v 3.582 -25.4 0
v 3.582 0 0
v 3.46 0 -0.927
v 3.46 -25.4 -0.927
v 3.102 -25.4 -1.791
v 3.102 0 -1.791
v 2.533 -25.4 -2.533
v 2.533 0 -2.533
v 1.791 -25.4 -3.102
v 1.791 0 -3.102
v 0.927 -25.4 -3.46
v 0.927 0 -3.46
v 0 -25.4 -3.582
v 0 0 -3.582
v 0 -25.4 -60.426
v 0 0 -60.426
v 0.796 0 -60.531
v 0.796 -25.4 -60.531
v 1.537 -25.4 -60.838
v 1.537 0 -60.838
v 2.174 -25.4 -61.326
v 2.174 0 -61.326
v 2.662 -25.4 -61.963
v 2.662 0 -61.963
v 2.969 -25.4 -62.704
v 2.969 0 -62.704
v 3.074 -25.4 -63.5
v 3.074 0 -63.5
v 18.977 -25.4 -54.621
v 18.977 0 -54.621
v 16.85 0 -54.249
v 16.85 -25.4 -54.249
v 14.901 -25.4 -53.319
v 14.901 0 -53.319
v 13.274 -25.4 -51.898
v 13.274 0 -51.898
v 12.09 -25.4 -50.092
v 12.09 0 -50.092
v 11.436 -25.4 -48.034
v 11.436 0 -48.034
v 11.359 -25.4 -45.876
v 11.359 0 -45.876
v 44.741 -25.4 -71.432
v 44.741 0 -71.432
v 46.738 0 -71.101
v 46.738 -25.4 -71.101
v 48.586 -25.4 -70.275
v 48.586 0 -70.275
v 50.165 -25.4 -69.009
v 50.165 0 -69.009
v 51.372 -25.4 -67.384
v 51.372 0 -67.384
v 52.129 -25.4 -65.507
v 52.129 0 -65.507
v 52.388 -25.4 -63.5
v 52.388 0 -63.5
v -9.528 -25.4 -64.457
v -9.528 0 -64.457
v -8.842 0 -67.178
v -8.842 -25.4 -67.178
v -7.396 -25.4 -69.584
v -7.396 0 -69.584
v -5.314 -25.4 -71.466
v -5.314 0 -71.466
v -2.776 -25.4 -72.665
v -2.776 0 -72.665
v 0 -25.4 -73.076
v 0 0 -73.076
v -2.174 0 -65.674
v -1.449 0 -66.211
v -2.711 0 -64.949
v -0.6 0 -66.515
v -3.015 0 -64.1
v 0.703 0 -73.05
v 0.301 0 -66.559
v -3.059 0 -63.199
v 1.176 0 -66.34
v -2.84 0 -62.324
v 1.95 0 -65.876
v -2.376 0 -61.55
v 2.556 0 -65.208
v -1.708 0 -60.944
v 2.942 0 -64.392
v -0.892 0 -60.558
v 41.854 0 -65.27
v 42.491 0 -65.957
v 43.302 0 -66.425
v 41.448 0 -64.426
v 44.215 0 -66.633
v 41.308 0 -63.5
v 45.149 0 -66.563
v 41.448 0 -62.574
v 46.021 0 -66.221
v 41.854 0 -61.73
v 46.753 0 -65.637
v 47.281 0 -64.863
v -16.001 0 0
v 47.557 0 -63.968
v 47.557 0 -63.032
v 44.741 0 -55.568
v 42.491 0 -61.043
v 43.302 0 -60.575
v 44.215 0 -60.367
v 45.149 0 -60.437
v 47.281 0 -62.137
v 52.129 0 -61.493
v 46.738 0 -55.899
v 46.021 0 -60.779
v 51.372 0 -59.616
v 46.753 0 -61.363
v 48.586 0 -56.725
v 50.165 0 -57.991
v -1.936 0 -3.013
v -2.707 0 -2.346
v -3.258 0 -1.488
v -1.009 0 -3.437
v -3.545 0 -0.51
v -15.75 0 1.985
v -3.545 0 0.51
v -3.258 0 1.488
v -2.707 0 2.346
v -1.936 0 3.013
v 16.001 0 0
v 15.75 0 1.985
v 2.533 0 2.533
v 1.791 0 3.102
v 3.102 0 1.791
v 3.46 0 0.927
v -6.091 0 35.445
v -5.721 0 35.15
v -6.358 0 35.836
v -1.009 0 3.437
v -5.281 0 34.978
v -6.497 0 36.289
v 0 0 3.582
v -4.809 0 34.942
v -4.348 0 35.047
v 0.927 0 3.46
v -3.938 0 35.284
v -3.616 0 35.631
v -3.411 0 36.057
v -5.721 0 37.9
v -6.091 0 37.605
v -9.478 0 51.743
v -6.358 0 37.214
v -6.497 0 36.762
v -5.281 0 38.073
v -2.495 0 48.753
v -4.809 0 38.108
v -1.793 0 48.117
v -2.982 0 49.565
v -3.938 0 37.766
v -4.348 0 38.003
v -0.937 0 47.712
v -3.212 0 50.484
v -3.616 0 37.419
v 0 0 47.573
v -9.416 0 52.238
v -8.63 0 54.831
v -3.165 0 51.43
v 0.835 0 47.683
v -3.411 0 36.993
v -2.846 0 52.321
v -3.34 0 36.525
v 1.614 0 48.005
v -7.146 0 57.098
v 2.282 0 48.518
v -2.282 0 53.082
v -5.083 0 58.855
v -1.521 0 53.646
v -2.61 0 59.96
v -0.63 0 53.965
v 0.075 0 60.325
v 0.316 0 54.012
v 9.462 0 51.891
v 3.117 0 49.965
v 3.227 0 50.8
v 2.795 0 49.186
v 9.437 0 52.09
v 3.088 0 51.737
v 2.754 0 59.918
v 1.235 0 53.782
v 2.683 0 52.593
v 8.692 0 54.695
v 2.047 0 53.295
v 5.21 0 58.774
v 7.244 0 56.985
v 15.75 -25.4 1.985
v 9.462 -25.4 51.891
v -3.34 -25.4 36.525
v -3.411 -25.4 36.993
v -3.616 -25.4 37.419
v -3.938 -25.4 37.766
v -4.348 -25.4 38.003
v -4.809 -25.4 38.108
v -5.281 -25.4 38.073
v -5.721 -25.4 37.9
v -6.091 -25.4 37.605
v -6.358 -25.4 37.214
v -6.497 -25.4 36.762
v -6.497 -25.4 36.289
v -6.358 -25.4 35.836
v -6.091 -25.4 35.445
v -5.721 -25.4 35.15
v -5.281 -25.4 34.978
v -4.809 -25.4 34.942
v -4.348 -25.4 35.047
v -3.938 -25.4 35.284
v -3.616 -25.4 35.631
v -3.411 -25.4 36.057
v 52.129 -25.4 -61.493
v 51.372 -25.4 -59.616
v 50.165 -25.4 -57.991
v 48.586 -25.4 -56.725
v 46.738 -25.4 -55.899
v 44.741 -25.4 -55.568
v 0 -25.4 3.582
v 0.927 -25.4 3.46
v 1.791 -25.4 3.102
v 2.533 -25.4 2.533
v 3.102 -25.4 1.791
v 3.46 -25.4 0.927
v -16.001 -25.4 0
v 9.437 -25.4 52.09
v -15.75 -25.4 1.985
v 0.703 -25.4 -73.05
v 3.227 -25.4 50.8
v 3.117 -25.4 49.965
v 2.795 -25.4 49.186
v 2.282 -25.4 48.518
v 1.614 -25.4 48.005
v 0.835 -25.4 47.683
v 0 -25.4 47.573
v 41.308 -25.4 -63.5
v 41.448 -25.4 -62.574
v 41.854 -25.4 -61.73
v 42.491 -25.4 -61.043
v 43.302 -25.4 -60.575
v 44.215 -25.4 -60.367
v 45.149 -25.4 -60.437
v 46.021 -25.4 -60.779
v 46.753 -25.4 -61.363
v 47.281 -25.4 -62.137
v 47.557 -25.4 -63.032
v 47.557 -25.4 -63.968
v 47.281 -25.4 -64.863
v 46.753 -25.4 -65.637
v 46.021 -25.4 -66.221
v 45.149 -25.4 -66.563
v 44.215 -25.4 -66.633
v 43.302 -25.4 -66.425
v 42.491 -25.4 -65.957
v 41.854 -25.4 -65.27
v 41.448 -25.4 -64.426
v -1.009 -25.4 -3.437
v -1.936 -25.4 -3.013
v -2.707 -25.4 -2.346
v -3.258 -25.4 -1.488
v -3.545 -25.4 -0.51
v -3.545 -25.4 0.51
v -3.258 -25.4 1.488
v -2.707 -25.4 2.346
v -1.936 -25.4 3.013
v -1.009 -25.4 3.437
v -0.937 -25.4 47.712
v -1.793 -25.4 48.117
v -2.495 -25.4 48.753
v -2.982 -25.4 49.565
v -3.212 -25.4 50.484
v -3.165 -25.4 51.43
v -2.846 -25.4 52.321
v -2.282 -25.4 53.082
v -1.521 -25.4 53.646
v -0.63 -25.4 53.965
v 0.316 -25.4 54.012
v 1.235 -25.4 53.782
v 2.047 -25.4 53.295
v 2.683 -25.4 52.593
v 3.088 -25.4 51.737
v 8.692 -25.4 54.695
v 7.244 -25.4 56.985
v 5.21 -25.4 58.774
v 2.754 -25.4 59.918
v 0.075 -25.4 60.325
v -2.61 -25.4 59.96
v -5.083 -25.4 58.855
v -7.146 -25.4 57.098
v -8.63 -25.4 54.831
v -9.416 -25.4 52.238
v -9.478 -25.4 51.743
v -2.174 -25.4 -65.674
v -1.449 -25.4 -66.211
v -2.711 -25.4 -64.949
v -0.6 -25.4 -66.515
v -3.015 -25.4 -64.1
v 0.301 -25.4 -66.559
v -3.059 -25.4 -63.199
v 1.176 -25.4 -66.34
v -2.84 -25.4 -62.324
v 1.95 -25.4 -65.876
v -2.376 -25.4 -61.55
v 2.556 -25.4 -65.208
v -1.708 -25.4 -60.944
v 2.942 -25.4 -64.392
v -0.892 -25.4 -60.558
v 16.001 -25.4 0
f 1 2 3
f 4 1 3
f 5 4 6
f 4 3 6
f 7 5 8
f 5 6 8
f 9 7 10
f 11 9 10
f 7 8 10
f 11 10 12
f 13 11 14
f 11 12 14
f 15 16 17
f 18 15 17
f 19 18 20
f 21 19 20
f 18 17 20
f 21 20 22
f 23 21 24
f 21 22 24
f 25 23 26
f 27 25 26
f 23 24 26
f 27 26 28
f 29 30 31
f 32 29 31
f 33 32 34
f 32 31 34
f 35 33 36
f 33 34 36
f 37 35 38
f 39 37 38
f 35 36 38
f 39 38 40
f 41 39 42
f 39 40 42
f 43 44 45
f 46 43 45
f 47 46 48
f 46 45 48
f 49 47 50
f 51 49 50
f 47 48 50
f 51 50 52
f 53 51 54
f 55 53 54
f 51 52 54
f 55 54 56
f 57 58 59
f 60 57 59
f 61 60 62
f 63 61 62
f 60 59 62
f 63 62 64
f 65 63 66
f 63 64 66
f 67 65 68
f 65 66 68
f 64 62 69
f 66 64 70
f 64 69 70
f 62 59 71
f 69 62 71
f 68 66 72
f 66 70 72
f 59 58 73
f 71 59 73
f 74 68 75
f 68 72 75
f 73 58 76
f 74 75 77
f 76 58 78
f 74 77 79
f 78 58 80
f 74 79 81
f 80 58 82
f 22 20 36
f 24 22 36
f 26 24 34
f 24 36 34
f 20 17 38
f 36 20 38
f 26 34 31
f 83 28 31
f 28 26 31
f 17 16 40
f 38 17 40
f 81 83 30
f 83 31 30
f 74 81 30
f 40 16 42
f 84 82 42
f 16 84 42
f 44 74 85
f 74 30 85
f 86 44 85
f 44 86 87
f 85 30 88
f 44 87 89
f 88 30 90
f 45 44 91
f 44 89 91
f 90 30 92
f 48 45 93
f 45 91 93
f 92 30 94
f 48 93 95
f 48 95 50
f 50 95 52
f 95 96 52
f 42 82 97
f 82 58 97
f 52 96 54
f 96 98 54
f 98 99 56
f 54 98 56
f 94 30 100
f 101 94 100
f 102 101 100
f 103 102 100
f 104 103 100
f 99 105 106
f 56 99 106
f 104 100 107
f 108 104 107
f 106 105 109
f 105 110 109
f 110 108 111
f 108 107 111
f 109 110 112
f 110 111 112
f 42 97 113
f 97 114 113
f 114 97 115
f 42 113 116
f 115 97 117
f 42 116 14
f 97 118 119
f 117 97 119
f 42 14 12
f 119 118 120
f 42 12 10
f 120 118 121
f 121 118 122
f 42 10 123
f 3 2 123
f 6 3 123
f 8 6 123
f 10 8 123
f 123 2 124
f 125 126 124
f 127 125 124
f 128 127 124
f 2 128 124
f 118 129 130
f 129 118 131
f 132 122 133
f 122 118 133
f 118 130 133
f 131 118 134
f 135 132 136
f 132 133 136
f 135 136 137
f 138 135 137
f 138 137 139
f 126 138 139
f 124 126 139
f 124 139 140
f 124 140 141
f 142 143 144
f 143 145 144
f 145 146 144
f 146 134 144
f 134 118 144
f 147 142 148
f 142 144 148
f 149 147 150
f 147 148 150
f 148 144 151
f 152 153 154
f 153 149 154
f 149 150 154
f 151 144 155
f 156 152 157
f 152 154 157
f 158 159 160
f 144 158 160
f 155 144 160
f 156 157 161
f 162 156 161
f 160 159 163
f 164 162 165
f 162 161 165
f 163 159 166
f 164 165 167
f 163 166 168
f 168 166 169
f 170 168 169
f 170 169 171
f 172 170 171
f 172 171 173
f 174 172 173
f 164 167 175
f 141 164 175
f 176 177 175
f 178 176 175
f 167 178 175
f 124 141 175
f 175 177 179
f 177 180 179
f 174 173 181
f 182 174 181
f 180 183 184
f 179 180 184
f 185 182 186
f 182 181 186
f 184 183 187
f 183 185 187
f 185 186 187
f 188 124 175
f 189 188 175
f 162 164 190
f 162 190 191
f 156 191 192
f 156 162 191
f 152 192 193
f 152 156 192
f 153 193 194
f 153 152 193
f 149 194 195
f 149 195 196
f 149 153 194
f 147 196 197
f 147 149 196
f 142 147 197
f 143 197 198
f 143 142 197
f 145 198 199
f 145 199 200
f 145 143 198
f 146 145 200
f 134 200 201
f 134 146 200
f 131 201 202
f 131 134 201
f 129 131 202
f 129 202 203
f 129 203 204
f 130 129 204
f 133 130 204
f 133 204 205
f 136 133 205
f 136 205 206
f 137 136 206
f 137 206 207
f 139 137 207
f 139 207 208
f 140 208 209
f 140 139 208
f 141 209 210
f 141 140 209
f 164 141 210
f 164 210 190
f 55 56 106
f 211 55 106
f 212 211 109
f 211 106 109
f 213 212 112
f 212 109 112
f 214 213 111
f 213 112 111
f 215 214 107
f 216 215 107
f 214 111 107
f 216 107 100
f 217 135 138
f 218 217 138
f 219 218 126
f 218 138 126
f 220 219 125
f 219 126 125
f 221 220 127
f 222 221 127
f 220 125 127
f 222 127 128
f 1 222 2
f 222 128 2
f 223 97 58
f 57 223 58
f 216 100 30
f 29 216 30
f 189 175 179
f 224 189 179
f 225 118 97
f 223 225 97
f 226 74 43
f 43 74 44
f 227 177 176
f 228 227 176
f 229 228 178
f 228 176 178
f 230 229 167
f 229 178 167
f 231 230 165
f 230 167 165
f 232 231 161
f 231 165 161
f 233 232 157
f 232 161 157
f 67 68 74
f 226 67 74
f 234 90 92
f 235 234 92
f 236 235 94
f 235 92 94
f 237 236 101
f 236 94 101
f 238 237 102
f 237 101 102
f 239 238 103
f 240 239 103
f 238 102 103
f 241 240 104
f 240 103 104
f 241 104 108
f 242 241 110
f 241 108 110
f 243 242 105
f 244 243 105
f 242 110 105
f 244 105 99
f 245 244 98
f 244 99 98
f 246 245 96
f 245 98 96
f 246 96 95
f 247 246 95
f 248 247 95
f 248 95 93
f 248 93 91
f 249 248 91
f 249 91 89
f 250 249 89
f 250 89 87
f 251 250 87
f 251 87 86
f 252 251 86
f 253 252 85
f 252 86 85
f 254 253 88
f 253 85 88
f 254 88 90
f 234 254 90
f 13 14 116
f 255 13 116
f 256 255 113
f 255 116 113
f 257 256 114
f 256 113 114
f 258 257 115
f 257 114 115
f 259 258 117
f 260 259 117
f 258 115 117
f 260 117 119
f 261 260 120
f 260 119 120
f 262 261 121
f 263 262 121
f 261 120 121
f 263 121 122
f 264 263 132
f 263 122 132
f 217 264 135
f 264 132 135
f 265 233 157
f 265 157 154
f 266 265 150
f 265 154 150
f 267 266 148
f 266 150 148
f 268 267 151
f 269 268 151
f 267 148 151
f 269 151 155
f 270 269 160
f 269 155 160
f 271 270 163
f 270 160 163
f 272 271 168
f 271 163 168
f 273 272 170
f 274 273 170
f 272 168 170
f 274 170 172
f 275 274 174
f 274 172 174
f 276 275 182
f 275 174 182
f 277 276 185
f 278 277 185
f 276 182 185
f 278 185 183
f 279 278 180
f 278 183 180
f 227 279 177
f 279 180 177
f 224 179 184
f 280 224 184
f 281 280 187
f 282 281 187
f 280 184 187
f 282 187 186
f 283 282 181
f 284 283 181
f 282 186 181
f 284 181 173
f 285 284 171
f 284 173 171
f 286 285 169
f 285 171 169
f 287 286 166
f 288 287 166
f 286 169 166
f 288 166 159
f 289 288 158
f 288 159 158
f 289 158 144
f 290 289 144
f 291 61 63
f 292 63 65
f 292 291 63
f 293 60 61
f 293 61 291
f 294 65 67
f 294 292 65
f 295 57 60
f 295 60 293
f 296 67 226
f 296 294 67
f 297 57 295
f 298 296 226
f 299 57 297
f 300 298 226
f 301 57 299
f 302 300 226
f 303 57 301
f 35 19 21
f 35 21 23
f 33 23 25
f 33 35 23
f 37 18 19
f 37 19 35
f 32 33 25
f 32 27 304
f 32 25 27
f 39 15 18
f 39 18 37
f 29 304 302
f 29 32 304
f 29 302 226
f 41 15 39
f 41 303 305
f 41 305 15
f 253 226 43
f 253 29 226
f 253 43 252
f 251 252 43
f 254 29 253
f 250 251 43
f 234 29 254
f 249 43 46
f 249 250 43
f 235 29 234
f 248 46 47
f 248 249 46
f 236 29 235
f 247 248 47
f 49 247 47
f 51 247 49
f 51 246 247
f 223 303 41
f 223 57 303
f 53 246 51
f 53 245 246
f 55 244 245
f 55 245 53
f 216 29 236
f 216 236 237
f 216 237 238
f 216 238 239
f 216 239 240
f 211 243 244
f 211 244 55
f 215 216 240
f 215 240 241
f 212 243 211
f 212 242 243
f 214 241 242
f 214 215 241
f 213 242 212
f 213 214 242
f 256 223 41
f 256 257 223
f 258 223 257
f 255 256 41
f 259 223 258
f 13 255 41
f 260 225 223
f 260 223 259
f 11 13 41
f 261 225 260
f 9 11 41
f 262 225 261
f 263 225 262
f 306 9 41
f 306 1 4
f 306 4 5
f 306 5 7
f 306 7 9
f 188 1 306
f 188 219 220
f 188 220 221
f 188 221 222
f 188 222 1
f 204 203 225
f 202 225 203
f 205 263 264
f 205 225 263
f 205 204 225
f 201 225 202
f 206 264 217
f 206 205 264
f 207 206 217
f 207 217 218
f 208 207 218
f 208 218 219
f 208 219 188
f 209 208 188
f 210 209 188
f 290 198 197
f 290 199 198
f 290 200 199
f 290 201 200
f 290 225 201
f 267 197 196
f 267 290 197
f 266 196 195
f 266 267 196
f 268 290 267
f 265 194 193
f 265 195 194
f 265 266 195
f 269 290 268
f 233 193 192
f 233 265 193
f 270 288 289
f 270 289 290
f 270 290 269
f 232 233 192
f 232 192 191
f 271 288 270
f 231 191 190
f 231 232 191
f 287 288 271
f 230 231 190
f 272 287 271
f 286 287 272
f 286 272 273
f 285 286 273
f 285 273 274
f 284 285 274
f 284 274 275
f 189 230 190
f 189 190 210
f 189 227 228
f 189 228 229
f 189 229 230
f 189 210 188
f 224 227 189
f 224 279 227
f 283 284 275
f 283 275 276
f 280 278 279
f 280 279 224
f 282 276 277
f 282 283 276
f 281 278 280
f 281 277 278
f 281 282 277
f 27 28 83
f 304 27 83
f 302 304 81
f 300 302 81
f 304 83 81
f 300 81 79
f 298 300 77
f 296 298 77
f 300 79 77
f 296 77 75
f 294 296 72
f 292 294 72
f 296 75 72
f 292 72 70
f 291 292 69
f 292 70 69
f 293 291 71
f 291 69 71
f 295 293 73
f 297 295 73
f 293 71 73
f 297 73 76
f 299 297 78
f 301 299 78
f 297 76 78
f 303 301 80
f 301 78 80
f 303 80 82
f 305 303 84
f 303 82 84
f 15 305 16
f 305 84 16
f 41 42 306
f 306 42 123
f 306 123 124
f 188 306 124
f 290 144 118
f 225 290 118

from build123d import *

# Parameters (mm, degrees)
F0_R     = 1.5875
F1_DEPTH = 25.4


with BuildPart() as f1:
    # F0 (on Front) → F1 (new body)
    with BuildSketch(Plane.XZ):
        with BuildLine():
            ThreePointArc((9.525, 50.8), (6.7351920908, 44.0648079092), (0, 41.275))
            Line((0, 41.275), (0, 15.875))
            ThreePointArc((0, 15.875), (10.500263397, 11.9063047833), (15.7504675666, 1.9845393503))
            Line((15.7504675666, 1.9845393503), (9.4622685099, 51.8913751176))
            ThreePointArc((9.4622685099, 51.8913751176), (9.5093041953, 51.3465882562), (9.525, 50.8))
        make_face()
        with BuildLine():
            Line((0, 15.875), (0, 41.275))
            ThreePointArc((0, 41.275), (-7.0608217366, 44.4070021583), (-9.4781770336, 51.7432842197))
            Line((-9.4781770336, 51.7432842197), (-15.7503596183, 1.9853959035))
            ThreePointArc((-15.7503596183, 1.9853959035), (-10.4999396434, 11.9065902963), (0, 15.875))
        make_face()
        with Locations((-4.9275723286, 36.5252)):
            Circle(F0_R, mode=Mode.SUBTRACT)
        with BuildLine():
            ThreePointArc((15.7504675666, 1.9845393503), (10.500263397, 11.9063047833), (0, 15.875))
            Line((0, 15.875), (0, 3.5818445827))
            ThreePointArc((0, 3.5818445827), (2.5327465936, 2.5327465936), (3.5818445827, 0))
            ThreePointArc((3.5818445827, 0), (2.5327465936, -2.5327465936), (0, -3.5818445827))
            Line((0, -3.5818445827), (0, -15.875))
            ThreePointArc((0, -15.875), (11.2253201513, -11.2253201513), (15.875, 0))
            ThreePointArc((15.875, 0), (15.8438363034, 0.9942213988), (15.7504675666, 1.9845393503))
        make_face()
        with BuildLine():
            Line((0, 3.5818445827), (0, 15.875))
            ThreePointArc((0, 15.875), (-10.4999396434, 11.9065902963), (-15.7503596183, 1.9853959035))
            ThreePointArc((-15.7503596183, 1.9853959035), (-11.9065902963, -10.4999396434), (0, -15.875))
            Line((0, -15.875), (0, -3.5818445827))
            ThreePointArc((0, -3.5818445827), (-3.5818445827, 0), (0, 3.5818445827))
        make_face()
        with BuildLine():
            ThreePointArc((0, -15.875), (-11.9065902963, -10.4999396434), (-15.7503596183, 1.9853959035))
            Line((-15.7503596183, 1.9853959035), (-16.0006267826, 0))
            Line((-16.0006267826, 0), (-9.5283009961, -64.4567694559))
            ThreePointArc((-9.5283009961, -64.4567694559), (-7.1016251441, -57.0757609029), (0, -53.923783228))
            Line((0, -53.923783228), (0, -15.875))
        make_face()
        with BuildLine():
            Line((16.0005170494, 0), (15.7504675666, 1.9845393503))
            ThreePointArc((15.7504675666, 1.9845393503), (15.8438363034, 0.9942213988), (15.875, 0))
            ThreePointArc((15.875, 0), (11.2253201513, -11.2253201513), (0, -15.875))
            Line((0, -15.875), (0, -53.923783228))
            ThreePointArc((0, -53.923783228), (6.7714078176, -56.7285921824), (9.576216772, -63.5))
            Line((9.576216772, -63.5), (36.5125, -63.5))
            ThreePointArc((36.5125, -63.5), (38.9413556042, -57.7852171371), (44.7414746571, -55.5678534573))
            Line((44.7414746571, -55.5678534573), (18.9771161719, -54.6211163395))
            ThreePointArc((18.9771161719, -54.6211163395), (13.2743662579, -51.8982857051), (11.3592341777, -45.876040911))
            Line((11.3592341777, -45.876040911), (16.0005170494, 0))
        make_face()
        with BuildLine():
            Line((36.5125, -63.5), (9.576216772, -63.5))
            ThreePointArc((9.576216772, -63.5), (7.0154951661, -70.0181864992), (0.7028263194, -73.050390716))
            Line((0.7028263194, -73.050390716), (44.7414746571, -71.4321465427))
            ThreePointArc((44.7414746571, -71.4321465427), (38.9413556042, -69.2147828629), (36.5125, -63.5))
        make_face()
        with BuildLine():
            ThreePointArc((-9.4781770336, 51.7432842197), (-7.0608217366, 44.4070021583), (0, 41.275))
            ThreePointArc((0, 41.275), (6.7351920908, 44.0648079092), (9.525, 50.8))
            ThreePointArc((9.525, 50.8), (9.5093041953, 51.3465882562), (9.4622685099, 51.8913751176))
            Line((9.4622685099, 51.8913751176), (9.4372495094, 52.089940579))
            ThreePointArc((9.4372495094, 52.089940579), (0.0749897766, 60.3247048003), (-9.4157689808, 52.2383739084))
            Line((-9.4157689808, 52.2383739084), (-9.4781770336, 51.7432842197))
        make_face()
        with BuildLine():
            ThreePointArc((3.2273454684, 50.8), (2.282077866, 48.517922134), (0, 47.5726545316))
            ThreePointArc((0, 47.5726545316), (-2.282077866, 53.082077866), (3.2273454684, 50.8))
        make_face(mode=Mode.SUBTRACT)
        with BuildLine():
            Line((0, -60.4259204753), (0, -53.923783228))
            ThreePointArc((0, -53.923783228), (-7.1016251441, -57.0757609029), (-9.5283009961, -64.4567694559))
            ThreePointArc((-9.5283009961, -64.4567694559), (-6.4242390971, -70.6016251441), (0, -73.076216772))
            Line((0, -73.076216772), (0.7028263194, -73.050390716))
            ThreePointArc((0.7028263194, -73.050390716), (7.0154951661, -70.0181864992), (9.576216772, -63.5))
            Line((9.576216772, -63.5), (3.0740795247, -63.5))
            ThreePointArc((3.0740795247, -63.5), (-2.1737024778, -65.6737024778), (0, -60.4259204753))
        make_face()
        with BuildLine():
            ThreePointArc((9.576216772, -63.5), (6.7714078176, -56.7285921824), (0, -53.923783228))
            Line((0, -53.923783228), (0, -60.4259204753))
            ThreePointArc((0, -60.4259204753), (2.1737024778, -61.3262975222), (3.0740795247, -63.5))
            Line((3.0740795247, -63.5), (9.576216772, -63.5))
        make_face()
        with BuildLine():
            ThreePointArc((52.3875, -63.5), (50.1647828629, -57.9913556042), (44.7414746571, -55.5678534573))
            ThreePointArc((44.7414746571, -55.5678534573), (38.9413556042, -57.7852171371), (36.5125, -63.5))
            ThreePointArc((36.5125, -63.5), (38.9413556042, -69.2147828629), (44.7414746571, -71.4321465427))
            ThreePointArc((44.7414746571, -71.4321465427), (50.1647828629, -69.0086443958), (52.3875, -63.5))
        make_face()
        with BuildLine():
            ThreePointArc((47.5920096932, -63.5), (44.45, -66.6420096932), (41.3079903068, -63.5))
            ThreePointArc((41.3079903068, -63.5), (44.45, -60.3579903068), (47.5920096932, -63.5))
        make_face(mode=Mode.SUBTRACT)
    extrude(amount=F1_DEPTH)


solid = f1.part
